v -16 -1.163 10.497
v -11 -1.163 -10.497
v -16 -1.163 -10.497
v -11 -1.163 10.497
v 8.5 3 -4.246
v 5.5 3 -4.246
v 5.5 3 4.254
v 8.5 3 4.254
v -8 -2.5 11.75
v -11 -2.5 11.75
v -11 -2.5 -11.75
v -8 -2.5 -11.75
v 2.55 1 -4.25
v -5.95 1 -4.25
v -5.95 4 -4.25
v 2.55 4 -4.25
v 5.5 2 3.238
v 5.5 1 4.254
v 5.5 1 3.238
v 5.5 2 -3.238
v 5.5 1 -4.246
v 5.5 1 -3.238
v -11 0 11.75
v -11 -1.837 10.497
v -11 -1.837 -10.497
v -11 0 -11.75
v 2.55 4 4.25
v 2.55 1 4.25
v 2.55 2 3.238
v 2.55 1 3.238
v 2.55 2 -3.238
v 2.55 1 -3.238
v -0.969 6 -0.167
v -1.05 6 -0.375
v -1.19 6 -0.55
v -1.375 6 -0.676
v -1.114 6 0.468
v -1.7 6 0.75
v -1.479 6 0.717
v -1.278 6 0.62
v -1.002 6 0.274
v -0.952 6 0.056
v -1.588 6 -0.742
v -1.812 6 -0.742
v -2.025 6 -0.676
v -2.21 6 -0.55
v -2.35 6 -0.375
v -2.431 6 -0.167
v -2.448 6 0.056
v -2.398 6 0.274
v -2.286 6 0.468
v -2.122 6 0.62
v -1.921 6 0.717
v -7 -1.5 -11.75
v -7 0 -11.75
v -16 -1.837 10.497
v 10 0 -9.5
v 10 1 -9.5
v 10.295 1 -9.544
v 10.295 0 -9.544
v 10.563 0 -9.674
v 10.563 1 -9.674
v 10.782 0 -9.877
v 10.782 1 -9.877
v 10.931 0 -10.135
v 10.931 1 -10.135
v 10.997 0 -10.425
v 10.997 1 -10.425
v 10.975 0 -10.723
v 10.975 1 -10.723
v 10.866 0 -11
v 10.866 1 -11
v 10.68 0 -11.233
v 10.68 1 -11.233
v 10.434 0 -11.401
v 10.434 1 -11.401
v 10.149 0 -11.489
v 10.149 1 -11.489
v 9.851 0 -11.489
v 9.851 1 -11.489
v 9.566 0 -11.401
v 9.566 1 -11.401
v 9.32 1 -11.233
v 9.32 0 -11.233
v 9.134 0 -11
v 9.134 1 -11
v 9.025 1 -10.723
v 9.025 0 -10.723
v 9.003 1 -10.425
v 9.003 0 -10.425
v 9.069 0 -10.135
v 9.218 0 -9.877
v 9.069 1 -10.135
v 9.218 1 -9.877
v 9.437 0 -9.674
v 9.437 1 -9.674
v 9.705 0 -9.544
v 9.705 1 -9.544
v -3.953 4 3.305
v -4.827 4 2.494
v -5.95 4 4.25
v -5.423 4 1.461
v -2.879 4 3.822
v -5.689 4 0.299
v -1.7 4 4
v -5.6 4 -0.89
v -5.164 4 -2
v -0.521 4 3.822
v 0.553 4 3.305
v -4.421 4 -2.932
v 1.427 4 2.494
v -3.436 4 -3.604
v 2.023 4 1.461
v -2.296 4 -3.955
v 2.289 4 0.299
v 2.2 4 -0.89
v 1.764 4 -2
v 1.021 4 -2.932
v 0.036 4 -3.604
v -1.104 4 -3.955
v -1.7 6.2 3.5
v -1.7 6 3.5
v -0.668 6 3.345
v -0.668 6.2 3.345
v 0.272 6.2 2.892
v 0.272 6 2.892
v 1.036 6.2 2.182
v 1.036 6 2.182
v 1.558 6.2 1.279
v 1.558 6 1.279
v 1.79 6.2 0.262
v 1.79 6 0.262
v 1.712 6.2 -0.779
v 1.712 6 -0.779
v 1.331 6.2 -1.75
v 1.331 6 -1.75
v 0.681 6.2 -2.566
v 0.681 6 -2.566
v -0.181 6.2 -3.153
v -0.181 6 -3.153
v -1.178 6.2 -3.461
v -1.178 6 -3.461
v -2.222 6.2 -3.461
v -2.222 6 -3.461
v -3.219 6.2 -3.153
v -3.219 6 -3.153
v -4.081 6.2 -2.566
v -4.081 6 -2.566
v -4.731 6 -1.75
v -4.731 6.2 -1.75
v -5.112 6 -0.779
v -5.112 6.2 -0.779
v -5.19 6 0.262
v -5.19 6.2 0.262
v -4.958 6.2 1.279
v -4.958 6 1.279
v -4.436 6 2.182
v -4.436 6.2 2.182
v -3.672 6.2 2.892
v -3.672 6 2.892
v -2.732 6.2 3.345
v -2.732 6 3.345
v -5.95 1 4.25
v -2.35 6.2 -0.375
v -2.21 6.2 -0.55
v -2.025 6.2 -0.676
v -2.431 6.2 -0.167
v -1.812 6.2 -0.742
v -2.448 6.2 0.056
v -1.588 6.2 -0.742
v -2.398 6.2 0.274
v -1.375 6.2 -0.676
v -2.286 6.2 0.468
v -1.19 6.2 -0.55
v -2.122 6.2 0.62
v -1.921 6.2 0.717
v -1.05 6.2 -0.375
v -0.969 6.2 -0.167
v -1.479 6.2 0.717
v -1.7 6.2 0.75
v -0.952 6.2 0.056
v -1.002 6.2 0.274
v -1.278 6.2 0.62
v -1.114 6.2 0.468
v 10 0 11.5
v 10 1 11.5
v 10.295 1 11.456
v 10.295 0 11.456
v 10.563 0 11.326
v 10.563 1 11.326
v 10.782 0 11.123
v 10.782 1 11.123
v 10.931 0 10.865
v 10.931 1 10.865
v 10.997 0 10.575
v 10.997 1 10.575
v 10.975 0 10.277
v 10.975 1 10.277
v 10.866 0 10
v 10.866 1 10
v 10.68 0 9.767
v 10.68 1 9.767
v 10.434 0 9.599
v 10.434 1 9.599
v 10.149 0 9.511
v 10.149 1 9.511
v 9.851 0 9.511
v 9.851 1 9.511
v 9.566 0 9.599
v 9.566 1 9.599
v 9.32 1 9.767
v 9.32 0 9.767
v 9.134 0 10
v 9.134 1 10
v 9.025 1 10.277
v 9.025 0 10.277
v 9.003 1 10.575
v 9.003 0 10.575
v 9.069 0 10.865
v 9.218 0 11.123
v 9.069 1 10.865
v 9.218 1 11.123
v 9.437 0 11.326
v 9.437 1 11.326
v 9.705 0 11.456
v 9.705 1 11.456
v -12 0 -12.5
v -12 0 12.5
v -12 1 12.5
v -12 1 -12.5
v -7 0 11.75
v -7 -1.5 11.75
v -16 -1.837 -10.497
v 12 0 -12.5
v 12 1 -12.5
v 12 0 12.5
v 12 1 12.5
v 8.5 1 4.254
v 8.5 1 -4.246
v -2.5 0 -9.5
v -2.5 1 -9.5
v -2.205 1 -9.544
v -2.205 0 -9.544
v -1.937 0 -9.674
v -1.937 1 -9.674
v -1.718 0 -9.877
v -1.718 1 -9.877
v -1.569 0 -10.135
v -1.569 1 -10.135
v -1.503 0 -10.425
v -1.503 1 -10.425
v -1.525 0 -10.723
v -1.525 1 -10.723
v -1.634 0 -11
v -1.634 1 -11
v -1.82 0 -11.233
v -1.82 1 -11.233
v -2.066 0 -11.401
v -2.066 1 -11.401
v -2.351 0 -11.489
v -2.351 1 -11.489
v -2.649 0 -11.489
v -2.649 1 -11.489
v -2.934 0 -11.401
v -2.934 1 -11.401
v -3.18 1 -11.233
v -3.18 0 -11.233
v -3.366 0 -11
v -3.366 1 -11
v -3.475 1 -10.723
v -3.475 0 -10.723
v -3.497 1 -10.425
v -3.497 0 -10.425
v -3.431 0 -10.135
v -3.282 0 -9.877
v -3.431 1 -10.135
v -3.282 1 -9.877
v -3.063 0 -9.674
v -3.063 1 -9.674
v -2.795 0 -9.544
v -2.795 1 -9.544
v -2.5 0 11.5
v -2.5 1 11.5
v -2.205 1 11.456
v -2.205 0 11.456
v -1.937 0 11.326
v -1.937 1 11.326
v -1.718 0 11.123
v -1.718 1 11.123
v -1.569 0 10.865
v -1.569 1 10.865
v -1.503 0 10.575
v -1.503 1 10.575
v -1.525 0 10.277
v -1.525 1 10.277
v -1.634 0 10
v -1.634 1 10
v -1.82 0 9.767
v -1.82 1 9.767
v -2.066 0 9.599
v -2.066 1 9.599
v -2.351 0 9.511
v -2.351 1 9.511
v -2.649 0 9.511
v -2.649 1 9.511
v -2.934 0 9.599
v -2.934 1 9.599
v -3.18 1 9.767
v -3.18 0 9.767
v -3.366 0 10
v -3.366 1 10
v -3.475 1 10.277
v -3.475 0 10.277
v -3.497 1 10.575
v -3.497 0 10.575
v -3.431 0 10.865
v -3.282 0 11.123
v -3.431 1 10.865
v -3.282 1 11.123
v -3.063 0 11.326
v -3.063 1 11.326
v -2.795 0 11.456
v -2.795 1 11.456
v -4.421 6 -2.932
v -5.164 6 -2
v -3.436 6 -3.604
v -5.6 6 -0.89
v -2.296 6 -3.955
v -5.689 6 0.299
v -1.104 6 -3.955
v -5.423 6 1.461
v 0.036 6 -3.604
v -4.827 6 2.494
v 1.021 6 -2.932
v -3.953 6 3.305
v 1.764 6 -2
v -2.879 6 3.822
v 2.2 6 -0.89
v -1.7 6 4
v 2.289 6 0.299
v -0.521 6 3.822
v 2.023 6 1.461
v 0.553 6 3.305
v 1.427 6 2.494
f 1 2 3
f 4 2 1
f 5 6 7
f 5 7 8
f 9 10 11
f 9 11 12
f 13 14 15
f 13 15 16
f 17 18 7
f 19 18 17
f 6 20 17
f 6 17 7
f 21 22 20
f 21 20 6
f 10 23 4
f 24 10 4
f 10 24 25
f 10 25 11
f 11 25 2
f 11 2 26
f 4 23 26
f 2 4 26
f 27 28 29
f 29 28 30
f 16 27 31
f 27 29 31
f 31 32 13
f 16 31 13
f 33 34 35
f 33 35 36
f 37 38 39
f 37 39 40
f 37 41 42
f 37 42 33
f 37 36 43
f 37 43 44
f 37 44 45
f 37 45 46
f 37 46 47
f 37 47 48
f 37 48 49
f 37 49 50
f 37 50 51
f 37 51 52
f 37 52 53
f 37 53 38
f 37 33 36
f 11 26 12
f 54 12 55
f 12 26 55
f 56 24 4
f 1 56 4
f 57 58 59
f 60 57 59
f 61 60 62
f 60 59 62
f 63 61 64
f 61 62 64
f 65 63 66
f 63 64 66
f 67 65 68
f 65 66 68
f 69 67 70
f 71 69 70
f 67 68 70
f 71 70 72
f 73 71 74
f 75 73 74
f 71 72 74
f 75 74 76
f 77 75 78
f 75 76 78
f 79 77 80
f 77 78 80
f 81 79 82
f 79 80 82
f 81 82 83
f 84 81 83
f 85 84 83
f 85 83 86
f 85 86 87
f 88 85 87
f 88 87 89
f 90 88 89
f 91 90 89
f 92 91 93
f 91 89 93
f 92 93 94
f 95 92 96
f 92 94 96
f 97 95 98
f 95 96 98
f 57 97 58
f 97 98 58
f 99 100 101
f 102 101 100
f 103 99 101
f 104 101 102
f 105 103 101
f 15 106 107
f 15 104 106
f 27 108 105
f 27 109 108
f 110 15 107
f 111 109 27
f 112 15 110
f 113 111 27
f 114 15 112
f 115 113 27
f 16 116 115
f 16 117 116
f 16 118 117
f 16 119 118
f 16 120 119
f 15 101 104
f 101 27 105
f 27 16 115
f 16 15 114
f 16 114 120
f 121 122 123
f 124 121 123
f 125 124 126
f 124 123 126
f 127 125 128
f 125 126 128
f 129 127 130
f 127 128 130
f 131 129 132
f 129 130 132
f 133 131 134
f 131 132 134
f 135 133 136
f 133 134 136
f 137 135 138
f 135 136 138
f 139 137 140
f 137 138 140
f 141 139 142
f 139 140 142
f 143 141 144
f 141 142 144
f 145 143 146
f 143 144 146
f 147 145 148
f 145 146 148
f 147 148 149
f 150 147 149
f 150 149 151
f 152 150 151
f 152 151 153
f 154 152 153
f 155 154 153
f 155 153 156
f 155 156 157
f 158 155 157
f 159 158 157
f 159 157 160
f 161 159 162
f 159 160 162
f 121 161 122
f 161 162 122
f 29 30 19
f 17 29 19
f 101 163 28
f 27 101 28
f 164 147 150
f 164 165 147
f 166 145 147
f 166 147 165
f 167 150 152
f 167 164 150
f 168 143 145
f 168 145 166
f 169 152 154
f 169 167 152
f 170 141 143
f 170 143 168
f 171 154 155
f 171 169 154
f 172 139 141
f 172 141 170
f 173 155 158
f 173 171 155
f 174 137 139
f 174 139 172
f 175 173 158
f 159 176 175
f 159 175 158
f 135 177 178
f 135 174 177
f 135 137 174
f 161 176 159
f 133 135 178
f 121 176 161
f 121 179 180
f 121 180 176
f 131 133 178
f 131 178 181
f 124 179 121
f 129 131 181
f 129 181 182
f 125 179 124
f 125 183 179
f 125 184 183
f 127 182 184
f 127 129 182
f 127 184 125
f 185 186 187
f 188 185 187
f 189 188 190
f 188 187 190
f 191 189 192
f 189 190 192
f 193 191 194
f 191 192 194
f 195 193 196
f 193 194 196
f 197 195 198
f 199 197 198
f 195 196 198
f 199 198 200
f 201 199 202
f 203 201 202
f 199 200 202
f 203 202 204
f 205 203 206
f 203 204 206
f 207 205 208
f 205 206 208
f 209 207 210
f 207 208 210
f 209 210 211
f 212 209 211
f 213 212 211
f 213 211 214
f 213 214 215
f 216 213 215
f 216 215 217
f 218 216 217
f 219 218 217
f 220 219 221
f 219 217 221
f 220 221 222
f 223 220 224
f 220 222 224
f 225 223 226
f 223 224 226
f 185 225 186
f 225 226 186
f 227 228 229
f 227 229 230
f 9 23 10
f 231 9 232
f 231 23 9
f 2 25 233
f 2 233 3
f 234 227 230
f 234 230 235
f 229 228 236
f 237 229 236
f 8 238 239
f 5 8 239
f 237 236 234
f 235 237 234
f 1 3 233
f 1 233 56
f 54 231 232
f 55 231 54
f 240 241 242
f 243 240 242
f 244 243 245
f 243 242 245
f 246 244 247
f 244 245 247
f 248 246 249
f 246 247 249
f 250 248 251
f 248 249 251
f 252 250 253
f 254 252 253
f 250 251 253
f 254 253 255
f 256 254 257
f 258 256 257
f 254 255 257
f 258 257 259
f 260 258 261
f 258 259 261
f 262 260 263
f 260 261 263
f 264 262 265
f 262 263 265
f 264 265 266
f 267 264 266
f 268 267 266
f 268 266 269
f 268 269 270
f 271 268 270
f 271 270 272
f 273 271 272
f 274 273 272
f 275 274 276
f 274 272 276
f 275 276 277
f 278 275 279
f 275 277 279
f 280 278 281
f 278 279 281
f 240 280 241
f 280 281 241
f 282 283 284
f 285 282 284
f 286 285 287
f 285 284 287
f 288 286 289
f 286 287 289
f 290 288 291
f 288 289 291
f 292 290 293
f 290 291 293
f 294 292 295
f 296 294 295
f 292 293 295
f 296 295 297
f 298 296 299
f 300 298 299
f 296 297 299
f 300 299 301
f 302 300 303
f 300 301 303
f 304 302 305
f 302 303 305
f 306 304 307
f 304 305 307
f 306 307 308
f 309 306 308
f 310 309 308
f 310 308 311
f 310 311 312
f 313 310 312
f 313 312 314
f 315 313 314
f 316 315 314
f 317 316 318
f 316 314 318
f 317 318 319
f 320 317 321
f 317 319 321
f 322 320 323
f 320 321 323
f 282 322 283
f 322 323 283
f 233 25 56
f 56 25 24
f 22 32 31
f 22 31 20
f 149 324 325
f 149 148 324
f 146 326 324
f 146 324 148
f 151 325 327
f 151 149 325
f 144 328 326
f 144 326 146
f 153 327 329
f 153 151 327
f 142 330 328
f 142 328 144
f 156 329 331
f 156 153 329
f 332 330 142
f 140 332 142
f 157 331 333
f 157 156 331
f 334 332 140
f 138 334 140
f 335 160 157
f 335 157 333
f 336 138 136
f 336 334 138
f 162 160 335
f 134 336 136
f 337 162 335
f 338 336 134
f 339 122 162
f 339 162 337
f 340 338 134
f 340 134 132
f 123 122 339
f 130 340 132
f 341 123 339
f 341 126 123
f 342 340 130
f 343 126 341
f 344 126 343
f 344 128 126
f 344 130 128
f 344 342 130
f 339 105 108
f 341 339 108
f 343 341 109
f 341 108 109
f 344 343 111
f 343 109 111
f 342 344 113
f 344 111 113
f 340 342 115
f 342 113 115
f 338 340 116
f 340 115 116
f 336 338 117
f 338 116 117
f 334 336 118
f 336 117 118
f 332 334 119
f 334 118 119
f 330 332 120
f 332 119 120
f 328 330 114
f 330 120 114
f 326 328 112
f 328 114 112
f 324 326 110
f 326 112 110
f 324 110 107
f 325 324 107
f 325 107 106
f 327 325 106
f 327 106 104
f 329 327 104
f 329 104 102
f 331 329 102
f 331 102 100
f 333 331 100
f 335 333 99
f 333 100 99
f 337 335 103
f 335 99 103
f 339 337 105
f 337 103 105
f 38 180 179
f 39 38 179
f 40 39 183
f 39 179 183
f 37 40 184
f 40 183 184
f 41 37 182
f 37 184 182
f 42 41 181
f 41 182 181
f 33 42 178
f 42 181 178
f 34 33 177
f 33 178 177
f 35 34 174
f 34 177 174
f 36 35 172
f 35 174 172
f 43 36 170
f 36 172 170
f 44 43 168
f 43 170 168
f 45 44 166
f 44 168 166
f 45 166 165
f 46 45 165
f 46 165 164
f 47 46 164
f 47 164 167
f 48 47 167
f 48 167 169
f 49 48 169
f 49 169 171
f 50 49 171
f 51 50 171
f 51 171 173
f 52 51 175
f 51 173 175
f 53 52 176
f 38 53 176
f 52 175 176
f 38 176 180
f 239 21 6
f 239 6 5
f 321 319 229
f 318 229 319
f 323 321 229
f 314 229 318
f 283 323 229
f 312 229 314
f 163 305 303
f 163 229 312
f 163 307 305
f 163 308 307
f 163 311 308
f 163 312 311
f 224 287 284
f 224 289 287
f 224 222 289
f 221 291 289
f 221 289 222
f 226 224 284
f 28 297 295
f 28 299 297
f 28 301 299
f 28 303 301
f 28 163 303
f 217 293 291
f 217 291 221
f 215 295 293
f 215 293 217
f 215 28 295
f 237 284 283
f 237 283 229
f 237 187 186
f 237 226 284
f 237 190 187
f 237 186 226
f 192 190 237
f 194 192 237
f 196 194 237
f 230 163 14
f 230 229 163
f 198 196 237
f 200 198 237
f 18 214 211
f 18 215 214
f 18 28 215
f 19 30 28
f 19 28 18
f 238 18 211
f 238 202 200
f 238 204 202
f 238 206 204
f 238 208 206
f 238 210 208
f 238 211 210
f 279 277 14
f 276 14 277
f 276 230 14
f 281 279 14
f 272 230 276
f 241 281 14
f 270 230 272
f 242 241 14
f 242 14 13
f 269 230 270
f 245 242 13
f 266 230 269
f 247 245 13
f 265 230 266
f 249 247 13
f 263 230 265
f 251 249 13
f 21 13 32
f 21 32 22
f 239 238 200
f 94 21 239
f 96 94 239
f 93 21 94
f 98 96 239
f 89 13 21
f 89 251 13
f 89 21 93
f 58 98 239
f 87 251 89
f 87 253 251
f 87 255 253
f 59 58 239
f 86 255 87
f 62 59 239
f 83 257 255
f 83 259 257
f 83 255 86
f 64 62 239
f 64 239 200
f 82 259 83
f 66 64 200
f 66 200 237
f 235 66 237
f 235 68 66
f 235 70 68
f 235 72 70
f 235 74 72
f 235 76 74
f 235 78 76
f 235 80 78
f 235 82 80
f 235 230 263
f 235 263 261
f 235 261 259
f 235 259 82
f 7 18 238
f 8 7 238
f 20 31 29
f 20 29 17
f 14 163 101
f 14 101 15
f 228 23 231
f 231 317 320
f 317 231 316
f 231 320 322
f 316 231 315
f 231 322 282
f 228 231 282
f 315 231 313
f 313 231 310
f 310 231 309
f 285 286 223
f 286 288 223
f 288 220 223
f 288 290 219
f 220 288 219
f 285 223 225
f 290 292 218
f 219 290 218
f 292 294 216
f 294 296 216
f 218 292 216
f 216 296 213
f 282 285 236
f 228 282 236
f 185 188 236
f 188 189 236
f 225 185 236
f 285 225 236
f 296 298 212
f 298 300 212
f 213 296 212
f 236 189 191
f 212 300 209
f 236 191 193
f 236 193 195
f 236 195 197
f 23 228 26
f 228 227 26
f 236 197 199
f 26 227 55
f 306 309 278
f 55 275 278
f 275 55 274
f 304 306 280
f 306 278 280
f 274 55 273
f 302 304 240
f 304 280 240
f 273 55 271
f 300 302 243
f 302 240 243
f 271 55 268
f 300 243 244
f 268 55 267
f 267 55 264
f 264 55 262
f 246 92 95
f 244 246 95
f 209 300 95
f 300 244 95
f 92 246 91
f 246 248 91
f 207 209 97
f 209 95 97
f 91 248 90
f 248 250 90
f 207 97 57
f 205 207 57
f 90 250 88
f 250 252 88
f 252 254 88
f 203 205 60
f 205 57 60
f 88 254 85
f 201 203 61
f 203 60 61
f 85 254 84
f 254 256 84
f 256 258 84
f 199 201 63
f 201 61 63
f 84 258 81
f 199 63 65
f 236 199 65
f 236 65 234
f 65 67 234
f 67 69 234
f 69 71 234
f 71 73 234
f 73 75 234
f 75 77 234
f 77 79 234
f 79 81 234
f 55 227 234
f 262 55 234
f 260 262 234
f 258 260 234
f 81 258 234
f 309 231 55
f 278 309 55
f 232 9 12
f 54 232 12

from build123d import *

# Parameters (mm, degrees)
SKETCH_1_W          = 24
SKETCH_1_H          = 25
EXTRUDE_1_DEPTH     = 1
SKETCH_2_W          = 8.5
SKETCH_2_H          = 8.5
EXTRUDE_2_DEPTH     = 3
SKETCH_3_R          = 4
EXTRUDE_3_DEPTH     = 2
SKETCH_4_W          = 3
SKETCH_4_H          = 8.5
EXTRUDE_4_DEPTH     = 2
SKETCH_5_W          = 2.95
SKETCH_5_H          = 6.47612255
EXTRUDE_5_DEPTH     = 1
SKETCH_6_W          = 4
SKETCH_6_H          = 23.5
EXTRUDE_6_DEPTH     = 2.5
CHAMFER_1_SIZE      = 1
SKETCH_7_W          = 20.993550262
SKETCH_7_H          = 0.673046144
EXTRUDE_7_DEPTH     = 5
SKETCH_8_R          = 1
CUT_EXTRUDE_1_DEPTH = 1
SKETCH_9_R          = 3.5
EXTRUDE_8_DEPTH     = 0.2
SKETCH_10_R         = 0.75
CUT_EXTRUDE_2_DEPTH = 0.2


with BuildPart() as part:
    # 草图1 → 凸台-拉伸1 (new body)
    with BuildSketch(Plane(origin=(0, 0, 0), x_dir=(1, 0, 0), z_dir=(0, 1, 0))):
        Rectangle(SKETCH_1_W, SKETCH_1_H)
    extrude(amount=EXTRUDE_1_DEPTH)

    # 草图2 → 凸台-拉伸2 (add)
    with BuildSketch(Plane(origin=(0, 1, 0), x_dir=(1, 0, 0), z_dir=(0, 1, 0))):
        with Locations((-1.7, 0)):
            Rectangle(SKETCH_2_W, SKETCH_2_H)
    extrude(amount=EXTRUDE_2_DEPTH)

    # 草图3 → 凸台-拉伸3 (add)
    with BuildSketch(Plane(origin=(0, 4, 0), x_dir=(1, 0, 0), z_dir=(0, 1, 0))):
        with Locations(Location((-1.7, 0, 0), (0, 0, 270))):
            Circle(SKETCH_3_R)
    extrude(amount=EXTRUDE_3_DEPTH)

    # 草图4 → 凸台-拉伸4 (add)
    with BuildSketch(Plane(origin=(0, 1, 0), x_dir=(1, 0, 0), z_dir=(0, 1, 0))):
        with Locations((7, -0.004190874)):
            Rectangle(SKETCH_4_W, SKETCH_4_H)
    extrude(amount=EXTRUDE_4_DEPTH)

    # 草图5 → 凸台-拉伸5 (add)
    with BuildSketch(Plane(origin=(0, 1, 0), x_dir=(1, 0, 0), z_dir=(0, 1, 0))):
        with Locations((4.025, 0)):
            Rectangle(SKETCH_5_W, SKETCH_5_H)
    extrude(amount=EXTRUDE_5_DEPTH)

    # 草图6 → 凸台-拉伸6 (add)
    with BuildSketch(Plane(origin=(0, 0, 0), x_dir=(1, 0, 0), z_dir=(0, 1, 0))):
        with Locations((-9, 0)):
            Rectangle(SKETCH_6_W, SKETCH_6_H)
    extrude(amount=-EXTRUDE_6_DEPTH)

    # 倒角1
    chamfer_1_edges = [part.edges().sort_by_distance(p)[0] for p in [
        (-7, -2.5, 0),
    ]]
    chamfer(chamfer_1_edges, length=CHAMFER_1_SIZE)

    # 草图7 → 凸台-拉伸7 (add)
    with BuildSketch(Plane.ZY.offset(11)):
        with Locations((0, -1.5)):
            Rectangle(SKETCH_7_W, SKETCH_7_H)
    extrude(amount=EXTRUDE_7_DEPTH)

    # 草图8 → 切除-拉伸1 (cut)
    with BuildSketch(Plane(origin=(0, 1, 0), x_dir=(1, 0, 0), z_dir=(0, 1, 0))):
        with Locations(Location((10, -10.5, 0), (0, 0, 270))):
            Circle(SKETCH_8_R)
        with Locations(Location((10, 10.5, 0), (0, 0, 270))):
            Circle(SKETCH_8_R)
        with Locations(Location((-2.5, -10.5, 0), (0, 0, 270))):
            Circle(SKETCH_8_R)
        with Locations(Location((-2.5, 10.5, 0), (0, 0, 270))):
            Circle(SKETCH_8_R)
    extrude(amount=-CUT_EXTRUDE_1_DEPTH, mode=Mode.SUBTRACT)

    # 草图9 → 凸台-拉伸8 (add)
    with BuildSketch(Plane(origin=(0, 6, 0), x_dir=(1, 0, 0), z_dir=(0, 1, 0))):
        with Locations(Location((-1.7, 0, 0), (0, 0, 270))):
            Circle(SKETCH_9_R)
    extrude(amount=EXTRUDE_8_DEPTH)

    # 草图10 → 切除-拉伸2 (cut)
    with BuildSketch(Plane(origin=(0, 6.2, 0), x_dir=(1, 0, 0), z_dir=(0, 1, 0))):
        with Locations(Location((-1.7, 0, 0), (0, 0, 270))):
            Circle(SKETCH_10_R)
    extrude(amount=-CUT_EXTRUDE_2_DEPTH, mode=Mode.SUBTRACT)


solid = part.part
